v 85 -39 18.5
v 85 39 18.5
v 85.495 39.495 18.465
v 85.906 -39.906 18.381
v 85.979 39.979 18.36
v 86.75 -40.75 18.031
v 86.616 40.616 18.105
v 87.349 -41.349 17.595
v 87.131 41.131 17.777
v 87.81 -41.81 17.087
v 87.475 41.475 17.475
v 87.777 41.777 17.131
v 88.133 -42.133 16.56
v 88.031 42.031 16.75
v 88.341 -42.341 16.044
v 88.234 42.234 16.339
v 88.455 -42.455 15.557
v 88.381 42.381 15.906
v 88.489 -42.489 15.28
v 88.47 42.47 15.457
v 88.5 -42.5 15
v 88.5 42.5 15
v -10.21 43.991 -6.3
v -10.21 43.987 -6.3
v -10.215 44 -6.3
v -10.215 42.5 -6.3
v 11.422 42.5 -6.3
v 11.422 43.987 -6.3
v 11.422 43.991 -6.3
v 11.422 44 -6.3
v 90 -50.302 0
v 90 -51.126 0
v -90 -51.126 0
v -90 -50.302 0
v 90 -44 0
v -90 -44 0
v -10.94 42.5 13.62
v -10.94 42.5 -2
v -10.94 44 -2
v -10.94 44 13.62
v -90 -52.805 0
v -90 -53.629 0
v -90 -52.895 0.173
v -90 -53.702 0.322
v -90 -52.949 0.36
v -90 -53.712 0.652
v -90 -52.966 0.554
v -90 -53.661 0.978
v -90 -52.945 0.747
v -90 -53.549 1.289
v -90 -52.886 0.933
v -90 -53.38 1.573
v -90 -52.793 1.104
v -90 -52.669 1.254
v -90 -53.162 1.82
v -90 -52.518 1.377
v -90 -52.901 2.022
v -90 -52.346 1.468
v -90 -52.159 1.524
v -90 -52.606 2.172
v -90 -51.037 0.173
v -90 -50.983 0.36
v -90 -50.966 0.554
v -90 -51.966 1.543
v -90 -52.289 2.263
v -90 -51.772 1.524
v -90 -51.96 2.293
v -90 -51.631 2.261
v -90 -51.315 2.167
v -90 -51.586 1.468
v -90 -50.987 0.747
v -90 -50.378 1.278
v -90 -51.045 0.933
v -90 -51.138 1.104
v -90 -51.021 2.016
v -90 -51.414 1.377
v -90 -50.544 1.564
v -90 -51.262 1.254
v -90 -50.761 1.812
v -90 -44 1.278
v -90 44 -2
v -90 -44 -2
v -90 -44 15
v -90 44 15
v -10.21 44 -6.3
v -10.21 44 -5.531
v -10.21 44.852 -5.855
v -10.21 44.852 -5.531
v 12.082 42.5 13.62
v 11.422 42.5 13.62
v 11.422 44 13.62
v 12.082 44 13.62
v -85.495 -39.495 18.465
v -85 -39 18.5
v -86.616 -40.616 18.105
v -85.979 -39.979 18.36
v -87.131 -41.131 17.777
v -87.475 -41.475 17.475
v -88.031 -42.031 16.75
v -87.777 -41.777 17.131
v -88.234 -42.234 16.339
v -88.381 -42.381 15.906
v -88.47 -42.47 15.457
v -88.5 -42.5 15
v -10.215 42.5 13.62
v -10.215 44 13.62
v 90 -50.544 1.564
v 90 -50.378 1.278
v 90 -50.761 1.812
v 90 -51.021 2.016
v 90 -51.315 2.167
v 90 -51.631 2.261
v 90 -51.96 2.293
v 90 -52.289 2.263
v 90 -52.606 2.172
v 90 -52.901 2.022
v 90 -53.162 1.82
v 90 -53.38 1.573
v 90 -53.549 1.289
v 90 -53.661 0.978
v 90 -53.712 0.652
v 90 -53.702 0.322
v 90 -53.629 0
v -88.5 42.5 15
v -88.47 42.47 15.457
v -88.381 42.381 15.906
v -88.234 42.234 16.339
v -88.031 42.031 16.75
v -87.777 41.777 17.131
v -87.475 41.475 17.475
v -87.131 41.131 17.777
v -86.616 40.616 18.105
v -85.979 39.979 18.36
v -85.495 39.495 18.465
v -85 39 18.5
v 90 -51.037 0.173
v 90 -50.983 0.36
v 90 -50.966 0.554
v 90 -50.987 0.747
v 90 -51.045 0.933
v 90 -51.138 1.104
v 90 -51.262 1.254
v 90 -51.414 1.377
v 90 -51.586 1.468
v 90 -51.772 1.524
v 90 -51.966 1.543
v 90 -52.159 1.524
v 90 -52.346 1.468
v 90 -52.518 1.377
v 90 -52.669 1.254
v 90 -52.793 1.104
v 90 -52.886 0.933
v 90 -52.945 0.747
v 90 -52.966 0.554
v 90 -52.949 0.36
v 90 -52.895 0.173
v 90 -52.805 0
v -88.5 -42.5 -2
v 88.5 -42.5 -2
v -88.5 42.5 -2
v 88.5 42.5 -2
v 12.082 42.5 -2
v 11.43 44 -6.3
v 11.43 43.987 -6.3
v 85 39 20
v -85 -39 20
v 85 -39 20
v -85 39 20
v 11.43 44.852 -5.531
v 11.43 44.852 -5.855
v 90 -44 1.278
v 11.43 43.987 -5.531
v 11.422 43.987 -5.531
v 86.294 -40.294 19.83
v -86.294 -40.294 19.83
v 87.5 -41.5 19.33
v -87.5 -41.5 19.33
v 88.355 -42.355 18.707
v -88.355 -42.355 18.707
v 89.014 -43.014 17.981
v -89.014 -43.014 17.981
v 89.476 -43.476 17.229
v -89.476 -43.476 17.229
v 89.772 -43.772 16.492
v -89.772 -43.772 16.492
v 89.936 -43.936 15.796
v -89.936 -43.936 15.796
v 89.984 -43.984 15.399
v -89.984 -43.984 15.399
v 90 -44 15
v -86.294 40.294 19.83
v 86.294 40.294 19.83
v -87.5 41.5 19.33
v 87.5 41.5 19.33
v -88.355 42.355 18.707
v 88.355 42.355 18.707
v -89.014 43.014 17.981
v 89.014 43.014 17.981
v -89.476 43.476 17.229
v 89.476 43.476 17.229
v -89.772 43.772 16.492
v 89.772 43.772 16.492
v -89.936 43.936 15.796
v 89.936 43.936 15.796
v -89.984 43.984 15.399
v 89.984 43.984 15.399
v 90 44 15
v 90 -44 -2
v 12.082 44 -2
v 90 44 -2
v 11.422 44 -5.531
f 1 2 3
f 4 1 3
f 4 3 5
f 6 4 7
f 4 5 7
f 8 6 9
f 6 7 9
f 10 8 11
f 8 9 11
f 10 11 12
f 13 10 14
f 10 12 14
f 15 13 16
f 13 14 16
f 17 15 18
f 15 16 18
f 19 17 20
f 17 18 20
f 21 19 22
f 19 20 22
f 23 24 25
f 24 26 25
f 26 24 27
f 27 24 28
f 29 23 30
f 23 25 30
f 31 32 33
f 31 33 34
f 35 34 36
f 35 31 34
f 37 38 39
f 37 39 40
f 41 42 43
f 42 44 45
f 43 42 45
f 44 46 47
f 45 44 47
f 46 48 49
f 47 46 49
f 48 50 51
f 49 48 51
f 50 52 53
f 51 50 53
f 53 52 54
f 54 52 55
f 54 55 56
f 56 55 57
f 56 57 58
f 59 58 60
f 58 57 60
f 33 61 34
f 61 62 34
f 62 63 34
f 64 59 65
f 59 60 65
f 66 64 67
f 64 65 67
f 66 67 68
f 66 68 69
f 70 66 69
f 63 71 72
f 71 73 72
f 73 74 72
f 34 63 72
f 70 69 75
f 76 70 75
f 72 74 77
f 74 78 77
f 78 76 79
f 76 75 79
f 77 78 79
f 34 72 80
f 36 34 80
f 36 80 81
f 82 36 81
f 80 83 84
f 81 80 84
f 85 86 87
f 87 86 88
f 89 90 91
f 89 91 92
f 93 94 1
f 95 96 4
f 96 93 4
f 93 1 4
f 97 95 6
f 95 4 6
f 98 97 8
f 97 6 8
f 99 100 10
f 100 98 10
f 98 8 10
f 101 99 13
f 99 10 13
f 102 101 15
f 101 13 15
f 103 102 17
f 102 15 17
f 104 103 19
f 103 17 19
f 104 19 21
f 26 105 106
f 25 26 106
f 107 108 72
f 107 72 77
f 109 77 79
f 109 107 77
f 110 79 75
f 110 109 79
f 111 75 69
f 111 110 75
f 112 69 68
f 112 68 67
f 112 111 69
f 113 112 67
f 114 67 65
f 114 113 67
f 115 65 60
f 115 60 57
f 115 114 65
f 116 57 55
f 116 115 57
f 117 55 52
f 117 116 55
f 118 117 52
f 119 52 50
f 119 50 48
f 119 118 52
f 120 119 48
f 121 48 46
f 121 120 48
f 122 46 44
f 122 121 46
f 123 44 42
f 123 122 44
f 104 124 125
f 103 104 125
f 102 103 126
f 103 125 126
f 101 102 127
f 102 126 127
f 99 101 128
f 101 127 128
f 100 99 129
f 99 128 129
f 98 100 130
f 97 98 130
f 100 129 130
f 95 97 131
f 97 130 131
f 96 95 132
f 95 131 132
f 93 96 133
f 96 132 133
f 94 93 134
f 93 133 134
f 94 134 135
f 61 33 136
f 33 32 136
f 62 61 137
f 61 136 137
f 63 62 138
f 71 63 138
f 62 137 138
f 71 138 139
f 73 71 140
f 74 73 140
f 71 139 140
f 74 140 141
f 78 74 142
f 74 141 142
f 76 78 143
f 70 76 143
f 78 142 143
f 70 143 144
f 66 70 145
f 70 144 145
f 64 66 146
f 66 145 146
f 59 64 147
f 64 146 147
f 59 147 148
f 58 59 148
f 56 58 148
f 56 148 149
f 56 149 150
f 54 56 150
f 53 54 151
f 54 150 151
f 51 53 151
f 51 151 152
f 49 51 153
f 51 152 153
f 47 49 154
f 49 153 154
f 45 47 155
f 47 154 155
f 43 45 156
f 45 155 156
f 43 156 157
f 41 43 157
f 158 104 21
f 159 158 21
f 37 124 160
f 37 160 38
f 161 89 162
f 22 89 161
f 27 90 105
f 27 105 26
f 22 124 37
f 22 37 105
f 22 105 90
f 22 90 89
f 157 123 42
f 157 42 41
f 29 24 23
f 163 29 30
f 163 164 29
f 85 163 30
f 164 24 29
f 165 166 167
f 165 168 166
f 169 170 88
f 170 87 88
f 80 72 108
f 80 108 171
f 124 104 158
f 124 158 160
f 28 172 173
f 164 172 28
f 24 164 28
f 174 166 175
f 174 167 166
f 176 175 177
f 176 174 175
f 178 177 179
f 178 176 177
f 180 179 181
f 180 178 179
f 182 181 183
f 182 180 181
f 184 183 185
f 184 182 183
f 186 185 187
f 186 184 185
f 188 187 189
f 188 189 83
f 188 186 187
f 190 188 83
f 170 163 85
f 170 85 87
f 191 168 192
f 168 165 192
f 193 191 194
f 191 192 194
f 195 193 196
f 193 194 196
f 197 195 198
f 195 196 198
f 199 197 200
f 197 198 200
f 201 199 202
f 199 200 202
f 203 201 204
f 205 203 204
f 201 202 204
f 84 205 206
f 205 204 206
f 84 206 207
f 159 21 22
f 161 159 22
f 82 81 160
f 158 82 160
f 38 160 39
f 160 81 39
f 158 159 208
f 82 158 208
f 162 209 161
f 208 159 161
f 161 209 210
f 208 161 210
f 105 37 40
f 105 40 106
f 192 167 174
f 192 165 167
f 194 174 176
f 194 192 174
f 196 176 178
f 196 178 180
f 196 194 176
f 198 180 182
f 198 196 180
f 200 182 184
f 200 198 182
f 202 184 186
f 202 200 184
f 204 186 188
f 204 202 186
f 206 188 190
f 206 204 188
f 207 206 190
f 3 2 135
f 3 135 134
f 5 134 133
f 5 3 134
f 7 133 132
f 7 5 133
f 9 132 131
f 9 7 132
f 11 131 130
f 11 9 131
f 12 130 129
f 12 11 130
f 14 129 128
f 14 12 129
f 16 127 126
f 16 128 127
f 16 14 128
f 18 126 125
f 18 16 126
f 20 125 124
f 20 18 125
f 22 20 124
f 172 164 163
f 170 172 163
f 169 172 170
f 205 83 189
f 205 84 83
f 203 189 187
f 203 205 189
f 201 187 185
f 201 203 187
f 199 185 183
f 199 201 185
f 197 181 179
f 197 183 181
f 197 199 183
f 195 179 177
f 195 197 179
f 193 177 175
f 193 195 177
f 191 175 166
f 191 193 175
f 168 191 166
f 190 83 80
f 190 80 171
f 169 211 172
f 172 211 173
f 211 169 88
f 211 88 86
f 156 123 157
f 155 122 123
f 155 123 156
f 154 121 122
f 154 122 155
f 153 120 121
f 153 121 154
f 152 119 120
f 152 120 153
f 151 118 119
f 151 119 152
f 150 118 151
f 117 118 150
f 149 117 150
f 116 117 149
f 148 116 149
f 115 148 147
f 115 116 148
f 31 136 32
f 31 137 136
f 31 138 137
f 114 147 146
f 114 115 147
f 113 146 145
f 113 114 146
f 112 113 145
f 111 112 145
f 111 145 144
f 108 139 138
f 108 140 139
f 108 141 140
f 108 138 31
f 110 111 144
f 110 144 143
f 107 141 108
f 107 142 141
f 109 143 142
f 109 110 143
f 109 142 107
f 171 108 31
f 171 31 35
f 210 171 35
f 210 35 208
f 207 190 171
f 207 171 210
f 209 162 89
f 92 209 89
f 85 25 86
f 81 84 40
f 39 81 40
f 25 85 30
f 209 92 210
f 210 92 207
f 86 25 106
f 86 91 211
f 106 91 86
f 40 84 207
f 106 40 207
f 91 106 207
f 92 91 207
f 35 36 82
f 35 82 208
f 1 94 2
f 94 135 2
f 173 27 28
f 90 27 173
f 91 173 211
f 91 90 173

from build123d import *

# Parameters (mm, degrees)
F0_W           = 180
F0_H           = 88
F1_DEPTH       = 20
F1_DEPTH_BACK  = 2
F2_R           = 5
F3_T           = -1.5
F4_W           = 6.8738348782
F4_H           = 1.2783666607
F5_DEPTH       = 90
F5_DEPTH_BACK  = 90
F6_R           = 1.75
F6_R_2         = 1
F7_DEPTH       = 90
F7_DEPTH_BACK  = 90
F8_W           = 5.3282827139
F8_H           = 1.7101019621
F9_DEPTH       = 90
F9_DEPTH_BACK  = 90
F10_DEPTH      = 80
F10_DEPTH_BACK = 80
F11_W          = 0.6596548483
F11_H          = 17.3489500303
F11_W_2        = 0.7256204262
F11_H_2        = 17.4149160739
F12_DEPTH      = 55.1
F13_DEPTH      = 4.3
F15_DEPTH      = 11.43
F15_DEPTH_BACK = 10.21


with BuildPart() as f1:
    # F0 (on Top) → F1 (new body, two sides)
    with BuildSketch(Plane.XY) as f1_sk:
        Rectangle(F0_W, F0_H)
    extrude(amount=F1_DEPTH)
    extrude(f1_sk.sketch, amount=-F1_DEPTH_BACK)

    # F2
    f2_edges = [f1.edges().sort_by_distance(p)[0] for p in [
        (0, -44, 20),
        (90, 0, 20),
        (0, 44, 20),
        (-90, 0, 20),
    ]]
    fillet(f2_edges, radius=F2_R)

    # F3
    f3_openings = [f1.faces().sort_by_distance(p)[0] for p in [
        (0, 0, -2),
    ]]
    offset(amount=F3_T, openings=f3_openings)

    # F4 (on Right) → F5 (join, two sides)
    with BuildSketch(Plane.YZ) as f5_sk:
        with Locations((-47.1954066306, 0.6391833303)):
            Rectangle(F4_W, F4_H)
    extrude(amount=F5_DEPTH)
    extrude(f5_sk.sketch, amount=-F5_DEPTH_BACK)

    # F6 (on Right) → F7 (join, two sides)
    with BuildSketch(Plane.YZ) as f7_sk:
        with Locations((-51.9656985998, 0.5429131561)):
            Circle(F6_R)
        with Locations((-51.9656985998, 0.5429131561)):
            Circle(F6_R_2, mode=Mode.SUBTRACT)
    extrude(amount=F7_DEPTH)
    extrude(f7_sk.sketch, amount=-F7_DEPTH_BACK)

    # F8 (on Right) → F9 (cut, two sides)
    with BuildSketch(Plane.YZ) as f9_sk:
        with Locations((-52.9466792941, -0.855050981)):
            Rectangle(F8_W, F8_H)
    extrude(amount=F9_DEPTH, mode=Mode.SUBTRACT)
    extrude(f9_sk.sketch, amount=-F9_DEPTH_BACK, mode=Mode.SUBTRACT)

    # F8 (on Right) → F10 (cut, two sides)
    with BuildSketch(Plane.YZ) as f10_sk:
        with Locations((-52.9466792941, -0.855050981)):
            Rectangle(F8_W, F8_H)
    extrude(amount=-F10_DEPTH, mode=Mode.SUBTRACT)
    extrude(f10_sk.sketch, amount=F10_DEPTH_BACK, mode=Mode.SUBTRACT)

    # F11 (on Front) → F12 (cut)
    with BuildSketch(Plane.XZ):
        with Locations((11.7518459447, 4.9456743291)):
            Rectangle(F11_W, F11_H)
        with Locations((-10.5775059201, 4.9126913073)):
            Rectangle(F11_W_2, F11_H_2)
    extrude(amount=-F12_DEPTH, mode=Mode.SUBTRACT)

    # F13 (add): a face of the model
    f13_faces = [f1.faces().sort_by_distance(p)[0] for p in [
        (0.6036614068, 43.25, -2),
    ]]
    extrude(f13_faces, amount=F13_DEPTH)

    # F14 (on Right) → F15 (join, two sides)
    with BuildSketch(Plane.YZ) as f15_sk:
        Polygon((43.986722827, -6.3001378439), (44.0000370145, -6.2996791676), (44.851500541, -5.855040258), (44.851500541, -5.530836992), (43.986722827, -5.530836992), align=None)
    extrude(amount=F15_DEPTH)
    extrude(f15_sk.sketch, amount=-F15_DEPTH_BACK)


solid = f1.part
